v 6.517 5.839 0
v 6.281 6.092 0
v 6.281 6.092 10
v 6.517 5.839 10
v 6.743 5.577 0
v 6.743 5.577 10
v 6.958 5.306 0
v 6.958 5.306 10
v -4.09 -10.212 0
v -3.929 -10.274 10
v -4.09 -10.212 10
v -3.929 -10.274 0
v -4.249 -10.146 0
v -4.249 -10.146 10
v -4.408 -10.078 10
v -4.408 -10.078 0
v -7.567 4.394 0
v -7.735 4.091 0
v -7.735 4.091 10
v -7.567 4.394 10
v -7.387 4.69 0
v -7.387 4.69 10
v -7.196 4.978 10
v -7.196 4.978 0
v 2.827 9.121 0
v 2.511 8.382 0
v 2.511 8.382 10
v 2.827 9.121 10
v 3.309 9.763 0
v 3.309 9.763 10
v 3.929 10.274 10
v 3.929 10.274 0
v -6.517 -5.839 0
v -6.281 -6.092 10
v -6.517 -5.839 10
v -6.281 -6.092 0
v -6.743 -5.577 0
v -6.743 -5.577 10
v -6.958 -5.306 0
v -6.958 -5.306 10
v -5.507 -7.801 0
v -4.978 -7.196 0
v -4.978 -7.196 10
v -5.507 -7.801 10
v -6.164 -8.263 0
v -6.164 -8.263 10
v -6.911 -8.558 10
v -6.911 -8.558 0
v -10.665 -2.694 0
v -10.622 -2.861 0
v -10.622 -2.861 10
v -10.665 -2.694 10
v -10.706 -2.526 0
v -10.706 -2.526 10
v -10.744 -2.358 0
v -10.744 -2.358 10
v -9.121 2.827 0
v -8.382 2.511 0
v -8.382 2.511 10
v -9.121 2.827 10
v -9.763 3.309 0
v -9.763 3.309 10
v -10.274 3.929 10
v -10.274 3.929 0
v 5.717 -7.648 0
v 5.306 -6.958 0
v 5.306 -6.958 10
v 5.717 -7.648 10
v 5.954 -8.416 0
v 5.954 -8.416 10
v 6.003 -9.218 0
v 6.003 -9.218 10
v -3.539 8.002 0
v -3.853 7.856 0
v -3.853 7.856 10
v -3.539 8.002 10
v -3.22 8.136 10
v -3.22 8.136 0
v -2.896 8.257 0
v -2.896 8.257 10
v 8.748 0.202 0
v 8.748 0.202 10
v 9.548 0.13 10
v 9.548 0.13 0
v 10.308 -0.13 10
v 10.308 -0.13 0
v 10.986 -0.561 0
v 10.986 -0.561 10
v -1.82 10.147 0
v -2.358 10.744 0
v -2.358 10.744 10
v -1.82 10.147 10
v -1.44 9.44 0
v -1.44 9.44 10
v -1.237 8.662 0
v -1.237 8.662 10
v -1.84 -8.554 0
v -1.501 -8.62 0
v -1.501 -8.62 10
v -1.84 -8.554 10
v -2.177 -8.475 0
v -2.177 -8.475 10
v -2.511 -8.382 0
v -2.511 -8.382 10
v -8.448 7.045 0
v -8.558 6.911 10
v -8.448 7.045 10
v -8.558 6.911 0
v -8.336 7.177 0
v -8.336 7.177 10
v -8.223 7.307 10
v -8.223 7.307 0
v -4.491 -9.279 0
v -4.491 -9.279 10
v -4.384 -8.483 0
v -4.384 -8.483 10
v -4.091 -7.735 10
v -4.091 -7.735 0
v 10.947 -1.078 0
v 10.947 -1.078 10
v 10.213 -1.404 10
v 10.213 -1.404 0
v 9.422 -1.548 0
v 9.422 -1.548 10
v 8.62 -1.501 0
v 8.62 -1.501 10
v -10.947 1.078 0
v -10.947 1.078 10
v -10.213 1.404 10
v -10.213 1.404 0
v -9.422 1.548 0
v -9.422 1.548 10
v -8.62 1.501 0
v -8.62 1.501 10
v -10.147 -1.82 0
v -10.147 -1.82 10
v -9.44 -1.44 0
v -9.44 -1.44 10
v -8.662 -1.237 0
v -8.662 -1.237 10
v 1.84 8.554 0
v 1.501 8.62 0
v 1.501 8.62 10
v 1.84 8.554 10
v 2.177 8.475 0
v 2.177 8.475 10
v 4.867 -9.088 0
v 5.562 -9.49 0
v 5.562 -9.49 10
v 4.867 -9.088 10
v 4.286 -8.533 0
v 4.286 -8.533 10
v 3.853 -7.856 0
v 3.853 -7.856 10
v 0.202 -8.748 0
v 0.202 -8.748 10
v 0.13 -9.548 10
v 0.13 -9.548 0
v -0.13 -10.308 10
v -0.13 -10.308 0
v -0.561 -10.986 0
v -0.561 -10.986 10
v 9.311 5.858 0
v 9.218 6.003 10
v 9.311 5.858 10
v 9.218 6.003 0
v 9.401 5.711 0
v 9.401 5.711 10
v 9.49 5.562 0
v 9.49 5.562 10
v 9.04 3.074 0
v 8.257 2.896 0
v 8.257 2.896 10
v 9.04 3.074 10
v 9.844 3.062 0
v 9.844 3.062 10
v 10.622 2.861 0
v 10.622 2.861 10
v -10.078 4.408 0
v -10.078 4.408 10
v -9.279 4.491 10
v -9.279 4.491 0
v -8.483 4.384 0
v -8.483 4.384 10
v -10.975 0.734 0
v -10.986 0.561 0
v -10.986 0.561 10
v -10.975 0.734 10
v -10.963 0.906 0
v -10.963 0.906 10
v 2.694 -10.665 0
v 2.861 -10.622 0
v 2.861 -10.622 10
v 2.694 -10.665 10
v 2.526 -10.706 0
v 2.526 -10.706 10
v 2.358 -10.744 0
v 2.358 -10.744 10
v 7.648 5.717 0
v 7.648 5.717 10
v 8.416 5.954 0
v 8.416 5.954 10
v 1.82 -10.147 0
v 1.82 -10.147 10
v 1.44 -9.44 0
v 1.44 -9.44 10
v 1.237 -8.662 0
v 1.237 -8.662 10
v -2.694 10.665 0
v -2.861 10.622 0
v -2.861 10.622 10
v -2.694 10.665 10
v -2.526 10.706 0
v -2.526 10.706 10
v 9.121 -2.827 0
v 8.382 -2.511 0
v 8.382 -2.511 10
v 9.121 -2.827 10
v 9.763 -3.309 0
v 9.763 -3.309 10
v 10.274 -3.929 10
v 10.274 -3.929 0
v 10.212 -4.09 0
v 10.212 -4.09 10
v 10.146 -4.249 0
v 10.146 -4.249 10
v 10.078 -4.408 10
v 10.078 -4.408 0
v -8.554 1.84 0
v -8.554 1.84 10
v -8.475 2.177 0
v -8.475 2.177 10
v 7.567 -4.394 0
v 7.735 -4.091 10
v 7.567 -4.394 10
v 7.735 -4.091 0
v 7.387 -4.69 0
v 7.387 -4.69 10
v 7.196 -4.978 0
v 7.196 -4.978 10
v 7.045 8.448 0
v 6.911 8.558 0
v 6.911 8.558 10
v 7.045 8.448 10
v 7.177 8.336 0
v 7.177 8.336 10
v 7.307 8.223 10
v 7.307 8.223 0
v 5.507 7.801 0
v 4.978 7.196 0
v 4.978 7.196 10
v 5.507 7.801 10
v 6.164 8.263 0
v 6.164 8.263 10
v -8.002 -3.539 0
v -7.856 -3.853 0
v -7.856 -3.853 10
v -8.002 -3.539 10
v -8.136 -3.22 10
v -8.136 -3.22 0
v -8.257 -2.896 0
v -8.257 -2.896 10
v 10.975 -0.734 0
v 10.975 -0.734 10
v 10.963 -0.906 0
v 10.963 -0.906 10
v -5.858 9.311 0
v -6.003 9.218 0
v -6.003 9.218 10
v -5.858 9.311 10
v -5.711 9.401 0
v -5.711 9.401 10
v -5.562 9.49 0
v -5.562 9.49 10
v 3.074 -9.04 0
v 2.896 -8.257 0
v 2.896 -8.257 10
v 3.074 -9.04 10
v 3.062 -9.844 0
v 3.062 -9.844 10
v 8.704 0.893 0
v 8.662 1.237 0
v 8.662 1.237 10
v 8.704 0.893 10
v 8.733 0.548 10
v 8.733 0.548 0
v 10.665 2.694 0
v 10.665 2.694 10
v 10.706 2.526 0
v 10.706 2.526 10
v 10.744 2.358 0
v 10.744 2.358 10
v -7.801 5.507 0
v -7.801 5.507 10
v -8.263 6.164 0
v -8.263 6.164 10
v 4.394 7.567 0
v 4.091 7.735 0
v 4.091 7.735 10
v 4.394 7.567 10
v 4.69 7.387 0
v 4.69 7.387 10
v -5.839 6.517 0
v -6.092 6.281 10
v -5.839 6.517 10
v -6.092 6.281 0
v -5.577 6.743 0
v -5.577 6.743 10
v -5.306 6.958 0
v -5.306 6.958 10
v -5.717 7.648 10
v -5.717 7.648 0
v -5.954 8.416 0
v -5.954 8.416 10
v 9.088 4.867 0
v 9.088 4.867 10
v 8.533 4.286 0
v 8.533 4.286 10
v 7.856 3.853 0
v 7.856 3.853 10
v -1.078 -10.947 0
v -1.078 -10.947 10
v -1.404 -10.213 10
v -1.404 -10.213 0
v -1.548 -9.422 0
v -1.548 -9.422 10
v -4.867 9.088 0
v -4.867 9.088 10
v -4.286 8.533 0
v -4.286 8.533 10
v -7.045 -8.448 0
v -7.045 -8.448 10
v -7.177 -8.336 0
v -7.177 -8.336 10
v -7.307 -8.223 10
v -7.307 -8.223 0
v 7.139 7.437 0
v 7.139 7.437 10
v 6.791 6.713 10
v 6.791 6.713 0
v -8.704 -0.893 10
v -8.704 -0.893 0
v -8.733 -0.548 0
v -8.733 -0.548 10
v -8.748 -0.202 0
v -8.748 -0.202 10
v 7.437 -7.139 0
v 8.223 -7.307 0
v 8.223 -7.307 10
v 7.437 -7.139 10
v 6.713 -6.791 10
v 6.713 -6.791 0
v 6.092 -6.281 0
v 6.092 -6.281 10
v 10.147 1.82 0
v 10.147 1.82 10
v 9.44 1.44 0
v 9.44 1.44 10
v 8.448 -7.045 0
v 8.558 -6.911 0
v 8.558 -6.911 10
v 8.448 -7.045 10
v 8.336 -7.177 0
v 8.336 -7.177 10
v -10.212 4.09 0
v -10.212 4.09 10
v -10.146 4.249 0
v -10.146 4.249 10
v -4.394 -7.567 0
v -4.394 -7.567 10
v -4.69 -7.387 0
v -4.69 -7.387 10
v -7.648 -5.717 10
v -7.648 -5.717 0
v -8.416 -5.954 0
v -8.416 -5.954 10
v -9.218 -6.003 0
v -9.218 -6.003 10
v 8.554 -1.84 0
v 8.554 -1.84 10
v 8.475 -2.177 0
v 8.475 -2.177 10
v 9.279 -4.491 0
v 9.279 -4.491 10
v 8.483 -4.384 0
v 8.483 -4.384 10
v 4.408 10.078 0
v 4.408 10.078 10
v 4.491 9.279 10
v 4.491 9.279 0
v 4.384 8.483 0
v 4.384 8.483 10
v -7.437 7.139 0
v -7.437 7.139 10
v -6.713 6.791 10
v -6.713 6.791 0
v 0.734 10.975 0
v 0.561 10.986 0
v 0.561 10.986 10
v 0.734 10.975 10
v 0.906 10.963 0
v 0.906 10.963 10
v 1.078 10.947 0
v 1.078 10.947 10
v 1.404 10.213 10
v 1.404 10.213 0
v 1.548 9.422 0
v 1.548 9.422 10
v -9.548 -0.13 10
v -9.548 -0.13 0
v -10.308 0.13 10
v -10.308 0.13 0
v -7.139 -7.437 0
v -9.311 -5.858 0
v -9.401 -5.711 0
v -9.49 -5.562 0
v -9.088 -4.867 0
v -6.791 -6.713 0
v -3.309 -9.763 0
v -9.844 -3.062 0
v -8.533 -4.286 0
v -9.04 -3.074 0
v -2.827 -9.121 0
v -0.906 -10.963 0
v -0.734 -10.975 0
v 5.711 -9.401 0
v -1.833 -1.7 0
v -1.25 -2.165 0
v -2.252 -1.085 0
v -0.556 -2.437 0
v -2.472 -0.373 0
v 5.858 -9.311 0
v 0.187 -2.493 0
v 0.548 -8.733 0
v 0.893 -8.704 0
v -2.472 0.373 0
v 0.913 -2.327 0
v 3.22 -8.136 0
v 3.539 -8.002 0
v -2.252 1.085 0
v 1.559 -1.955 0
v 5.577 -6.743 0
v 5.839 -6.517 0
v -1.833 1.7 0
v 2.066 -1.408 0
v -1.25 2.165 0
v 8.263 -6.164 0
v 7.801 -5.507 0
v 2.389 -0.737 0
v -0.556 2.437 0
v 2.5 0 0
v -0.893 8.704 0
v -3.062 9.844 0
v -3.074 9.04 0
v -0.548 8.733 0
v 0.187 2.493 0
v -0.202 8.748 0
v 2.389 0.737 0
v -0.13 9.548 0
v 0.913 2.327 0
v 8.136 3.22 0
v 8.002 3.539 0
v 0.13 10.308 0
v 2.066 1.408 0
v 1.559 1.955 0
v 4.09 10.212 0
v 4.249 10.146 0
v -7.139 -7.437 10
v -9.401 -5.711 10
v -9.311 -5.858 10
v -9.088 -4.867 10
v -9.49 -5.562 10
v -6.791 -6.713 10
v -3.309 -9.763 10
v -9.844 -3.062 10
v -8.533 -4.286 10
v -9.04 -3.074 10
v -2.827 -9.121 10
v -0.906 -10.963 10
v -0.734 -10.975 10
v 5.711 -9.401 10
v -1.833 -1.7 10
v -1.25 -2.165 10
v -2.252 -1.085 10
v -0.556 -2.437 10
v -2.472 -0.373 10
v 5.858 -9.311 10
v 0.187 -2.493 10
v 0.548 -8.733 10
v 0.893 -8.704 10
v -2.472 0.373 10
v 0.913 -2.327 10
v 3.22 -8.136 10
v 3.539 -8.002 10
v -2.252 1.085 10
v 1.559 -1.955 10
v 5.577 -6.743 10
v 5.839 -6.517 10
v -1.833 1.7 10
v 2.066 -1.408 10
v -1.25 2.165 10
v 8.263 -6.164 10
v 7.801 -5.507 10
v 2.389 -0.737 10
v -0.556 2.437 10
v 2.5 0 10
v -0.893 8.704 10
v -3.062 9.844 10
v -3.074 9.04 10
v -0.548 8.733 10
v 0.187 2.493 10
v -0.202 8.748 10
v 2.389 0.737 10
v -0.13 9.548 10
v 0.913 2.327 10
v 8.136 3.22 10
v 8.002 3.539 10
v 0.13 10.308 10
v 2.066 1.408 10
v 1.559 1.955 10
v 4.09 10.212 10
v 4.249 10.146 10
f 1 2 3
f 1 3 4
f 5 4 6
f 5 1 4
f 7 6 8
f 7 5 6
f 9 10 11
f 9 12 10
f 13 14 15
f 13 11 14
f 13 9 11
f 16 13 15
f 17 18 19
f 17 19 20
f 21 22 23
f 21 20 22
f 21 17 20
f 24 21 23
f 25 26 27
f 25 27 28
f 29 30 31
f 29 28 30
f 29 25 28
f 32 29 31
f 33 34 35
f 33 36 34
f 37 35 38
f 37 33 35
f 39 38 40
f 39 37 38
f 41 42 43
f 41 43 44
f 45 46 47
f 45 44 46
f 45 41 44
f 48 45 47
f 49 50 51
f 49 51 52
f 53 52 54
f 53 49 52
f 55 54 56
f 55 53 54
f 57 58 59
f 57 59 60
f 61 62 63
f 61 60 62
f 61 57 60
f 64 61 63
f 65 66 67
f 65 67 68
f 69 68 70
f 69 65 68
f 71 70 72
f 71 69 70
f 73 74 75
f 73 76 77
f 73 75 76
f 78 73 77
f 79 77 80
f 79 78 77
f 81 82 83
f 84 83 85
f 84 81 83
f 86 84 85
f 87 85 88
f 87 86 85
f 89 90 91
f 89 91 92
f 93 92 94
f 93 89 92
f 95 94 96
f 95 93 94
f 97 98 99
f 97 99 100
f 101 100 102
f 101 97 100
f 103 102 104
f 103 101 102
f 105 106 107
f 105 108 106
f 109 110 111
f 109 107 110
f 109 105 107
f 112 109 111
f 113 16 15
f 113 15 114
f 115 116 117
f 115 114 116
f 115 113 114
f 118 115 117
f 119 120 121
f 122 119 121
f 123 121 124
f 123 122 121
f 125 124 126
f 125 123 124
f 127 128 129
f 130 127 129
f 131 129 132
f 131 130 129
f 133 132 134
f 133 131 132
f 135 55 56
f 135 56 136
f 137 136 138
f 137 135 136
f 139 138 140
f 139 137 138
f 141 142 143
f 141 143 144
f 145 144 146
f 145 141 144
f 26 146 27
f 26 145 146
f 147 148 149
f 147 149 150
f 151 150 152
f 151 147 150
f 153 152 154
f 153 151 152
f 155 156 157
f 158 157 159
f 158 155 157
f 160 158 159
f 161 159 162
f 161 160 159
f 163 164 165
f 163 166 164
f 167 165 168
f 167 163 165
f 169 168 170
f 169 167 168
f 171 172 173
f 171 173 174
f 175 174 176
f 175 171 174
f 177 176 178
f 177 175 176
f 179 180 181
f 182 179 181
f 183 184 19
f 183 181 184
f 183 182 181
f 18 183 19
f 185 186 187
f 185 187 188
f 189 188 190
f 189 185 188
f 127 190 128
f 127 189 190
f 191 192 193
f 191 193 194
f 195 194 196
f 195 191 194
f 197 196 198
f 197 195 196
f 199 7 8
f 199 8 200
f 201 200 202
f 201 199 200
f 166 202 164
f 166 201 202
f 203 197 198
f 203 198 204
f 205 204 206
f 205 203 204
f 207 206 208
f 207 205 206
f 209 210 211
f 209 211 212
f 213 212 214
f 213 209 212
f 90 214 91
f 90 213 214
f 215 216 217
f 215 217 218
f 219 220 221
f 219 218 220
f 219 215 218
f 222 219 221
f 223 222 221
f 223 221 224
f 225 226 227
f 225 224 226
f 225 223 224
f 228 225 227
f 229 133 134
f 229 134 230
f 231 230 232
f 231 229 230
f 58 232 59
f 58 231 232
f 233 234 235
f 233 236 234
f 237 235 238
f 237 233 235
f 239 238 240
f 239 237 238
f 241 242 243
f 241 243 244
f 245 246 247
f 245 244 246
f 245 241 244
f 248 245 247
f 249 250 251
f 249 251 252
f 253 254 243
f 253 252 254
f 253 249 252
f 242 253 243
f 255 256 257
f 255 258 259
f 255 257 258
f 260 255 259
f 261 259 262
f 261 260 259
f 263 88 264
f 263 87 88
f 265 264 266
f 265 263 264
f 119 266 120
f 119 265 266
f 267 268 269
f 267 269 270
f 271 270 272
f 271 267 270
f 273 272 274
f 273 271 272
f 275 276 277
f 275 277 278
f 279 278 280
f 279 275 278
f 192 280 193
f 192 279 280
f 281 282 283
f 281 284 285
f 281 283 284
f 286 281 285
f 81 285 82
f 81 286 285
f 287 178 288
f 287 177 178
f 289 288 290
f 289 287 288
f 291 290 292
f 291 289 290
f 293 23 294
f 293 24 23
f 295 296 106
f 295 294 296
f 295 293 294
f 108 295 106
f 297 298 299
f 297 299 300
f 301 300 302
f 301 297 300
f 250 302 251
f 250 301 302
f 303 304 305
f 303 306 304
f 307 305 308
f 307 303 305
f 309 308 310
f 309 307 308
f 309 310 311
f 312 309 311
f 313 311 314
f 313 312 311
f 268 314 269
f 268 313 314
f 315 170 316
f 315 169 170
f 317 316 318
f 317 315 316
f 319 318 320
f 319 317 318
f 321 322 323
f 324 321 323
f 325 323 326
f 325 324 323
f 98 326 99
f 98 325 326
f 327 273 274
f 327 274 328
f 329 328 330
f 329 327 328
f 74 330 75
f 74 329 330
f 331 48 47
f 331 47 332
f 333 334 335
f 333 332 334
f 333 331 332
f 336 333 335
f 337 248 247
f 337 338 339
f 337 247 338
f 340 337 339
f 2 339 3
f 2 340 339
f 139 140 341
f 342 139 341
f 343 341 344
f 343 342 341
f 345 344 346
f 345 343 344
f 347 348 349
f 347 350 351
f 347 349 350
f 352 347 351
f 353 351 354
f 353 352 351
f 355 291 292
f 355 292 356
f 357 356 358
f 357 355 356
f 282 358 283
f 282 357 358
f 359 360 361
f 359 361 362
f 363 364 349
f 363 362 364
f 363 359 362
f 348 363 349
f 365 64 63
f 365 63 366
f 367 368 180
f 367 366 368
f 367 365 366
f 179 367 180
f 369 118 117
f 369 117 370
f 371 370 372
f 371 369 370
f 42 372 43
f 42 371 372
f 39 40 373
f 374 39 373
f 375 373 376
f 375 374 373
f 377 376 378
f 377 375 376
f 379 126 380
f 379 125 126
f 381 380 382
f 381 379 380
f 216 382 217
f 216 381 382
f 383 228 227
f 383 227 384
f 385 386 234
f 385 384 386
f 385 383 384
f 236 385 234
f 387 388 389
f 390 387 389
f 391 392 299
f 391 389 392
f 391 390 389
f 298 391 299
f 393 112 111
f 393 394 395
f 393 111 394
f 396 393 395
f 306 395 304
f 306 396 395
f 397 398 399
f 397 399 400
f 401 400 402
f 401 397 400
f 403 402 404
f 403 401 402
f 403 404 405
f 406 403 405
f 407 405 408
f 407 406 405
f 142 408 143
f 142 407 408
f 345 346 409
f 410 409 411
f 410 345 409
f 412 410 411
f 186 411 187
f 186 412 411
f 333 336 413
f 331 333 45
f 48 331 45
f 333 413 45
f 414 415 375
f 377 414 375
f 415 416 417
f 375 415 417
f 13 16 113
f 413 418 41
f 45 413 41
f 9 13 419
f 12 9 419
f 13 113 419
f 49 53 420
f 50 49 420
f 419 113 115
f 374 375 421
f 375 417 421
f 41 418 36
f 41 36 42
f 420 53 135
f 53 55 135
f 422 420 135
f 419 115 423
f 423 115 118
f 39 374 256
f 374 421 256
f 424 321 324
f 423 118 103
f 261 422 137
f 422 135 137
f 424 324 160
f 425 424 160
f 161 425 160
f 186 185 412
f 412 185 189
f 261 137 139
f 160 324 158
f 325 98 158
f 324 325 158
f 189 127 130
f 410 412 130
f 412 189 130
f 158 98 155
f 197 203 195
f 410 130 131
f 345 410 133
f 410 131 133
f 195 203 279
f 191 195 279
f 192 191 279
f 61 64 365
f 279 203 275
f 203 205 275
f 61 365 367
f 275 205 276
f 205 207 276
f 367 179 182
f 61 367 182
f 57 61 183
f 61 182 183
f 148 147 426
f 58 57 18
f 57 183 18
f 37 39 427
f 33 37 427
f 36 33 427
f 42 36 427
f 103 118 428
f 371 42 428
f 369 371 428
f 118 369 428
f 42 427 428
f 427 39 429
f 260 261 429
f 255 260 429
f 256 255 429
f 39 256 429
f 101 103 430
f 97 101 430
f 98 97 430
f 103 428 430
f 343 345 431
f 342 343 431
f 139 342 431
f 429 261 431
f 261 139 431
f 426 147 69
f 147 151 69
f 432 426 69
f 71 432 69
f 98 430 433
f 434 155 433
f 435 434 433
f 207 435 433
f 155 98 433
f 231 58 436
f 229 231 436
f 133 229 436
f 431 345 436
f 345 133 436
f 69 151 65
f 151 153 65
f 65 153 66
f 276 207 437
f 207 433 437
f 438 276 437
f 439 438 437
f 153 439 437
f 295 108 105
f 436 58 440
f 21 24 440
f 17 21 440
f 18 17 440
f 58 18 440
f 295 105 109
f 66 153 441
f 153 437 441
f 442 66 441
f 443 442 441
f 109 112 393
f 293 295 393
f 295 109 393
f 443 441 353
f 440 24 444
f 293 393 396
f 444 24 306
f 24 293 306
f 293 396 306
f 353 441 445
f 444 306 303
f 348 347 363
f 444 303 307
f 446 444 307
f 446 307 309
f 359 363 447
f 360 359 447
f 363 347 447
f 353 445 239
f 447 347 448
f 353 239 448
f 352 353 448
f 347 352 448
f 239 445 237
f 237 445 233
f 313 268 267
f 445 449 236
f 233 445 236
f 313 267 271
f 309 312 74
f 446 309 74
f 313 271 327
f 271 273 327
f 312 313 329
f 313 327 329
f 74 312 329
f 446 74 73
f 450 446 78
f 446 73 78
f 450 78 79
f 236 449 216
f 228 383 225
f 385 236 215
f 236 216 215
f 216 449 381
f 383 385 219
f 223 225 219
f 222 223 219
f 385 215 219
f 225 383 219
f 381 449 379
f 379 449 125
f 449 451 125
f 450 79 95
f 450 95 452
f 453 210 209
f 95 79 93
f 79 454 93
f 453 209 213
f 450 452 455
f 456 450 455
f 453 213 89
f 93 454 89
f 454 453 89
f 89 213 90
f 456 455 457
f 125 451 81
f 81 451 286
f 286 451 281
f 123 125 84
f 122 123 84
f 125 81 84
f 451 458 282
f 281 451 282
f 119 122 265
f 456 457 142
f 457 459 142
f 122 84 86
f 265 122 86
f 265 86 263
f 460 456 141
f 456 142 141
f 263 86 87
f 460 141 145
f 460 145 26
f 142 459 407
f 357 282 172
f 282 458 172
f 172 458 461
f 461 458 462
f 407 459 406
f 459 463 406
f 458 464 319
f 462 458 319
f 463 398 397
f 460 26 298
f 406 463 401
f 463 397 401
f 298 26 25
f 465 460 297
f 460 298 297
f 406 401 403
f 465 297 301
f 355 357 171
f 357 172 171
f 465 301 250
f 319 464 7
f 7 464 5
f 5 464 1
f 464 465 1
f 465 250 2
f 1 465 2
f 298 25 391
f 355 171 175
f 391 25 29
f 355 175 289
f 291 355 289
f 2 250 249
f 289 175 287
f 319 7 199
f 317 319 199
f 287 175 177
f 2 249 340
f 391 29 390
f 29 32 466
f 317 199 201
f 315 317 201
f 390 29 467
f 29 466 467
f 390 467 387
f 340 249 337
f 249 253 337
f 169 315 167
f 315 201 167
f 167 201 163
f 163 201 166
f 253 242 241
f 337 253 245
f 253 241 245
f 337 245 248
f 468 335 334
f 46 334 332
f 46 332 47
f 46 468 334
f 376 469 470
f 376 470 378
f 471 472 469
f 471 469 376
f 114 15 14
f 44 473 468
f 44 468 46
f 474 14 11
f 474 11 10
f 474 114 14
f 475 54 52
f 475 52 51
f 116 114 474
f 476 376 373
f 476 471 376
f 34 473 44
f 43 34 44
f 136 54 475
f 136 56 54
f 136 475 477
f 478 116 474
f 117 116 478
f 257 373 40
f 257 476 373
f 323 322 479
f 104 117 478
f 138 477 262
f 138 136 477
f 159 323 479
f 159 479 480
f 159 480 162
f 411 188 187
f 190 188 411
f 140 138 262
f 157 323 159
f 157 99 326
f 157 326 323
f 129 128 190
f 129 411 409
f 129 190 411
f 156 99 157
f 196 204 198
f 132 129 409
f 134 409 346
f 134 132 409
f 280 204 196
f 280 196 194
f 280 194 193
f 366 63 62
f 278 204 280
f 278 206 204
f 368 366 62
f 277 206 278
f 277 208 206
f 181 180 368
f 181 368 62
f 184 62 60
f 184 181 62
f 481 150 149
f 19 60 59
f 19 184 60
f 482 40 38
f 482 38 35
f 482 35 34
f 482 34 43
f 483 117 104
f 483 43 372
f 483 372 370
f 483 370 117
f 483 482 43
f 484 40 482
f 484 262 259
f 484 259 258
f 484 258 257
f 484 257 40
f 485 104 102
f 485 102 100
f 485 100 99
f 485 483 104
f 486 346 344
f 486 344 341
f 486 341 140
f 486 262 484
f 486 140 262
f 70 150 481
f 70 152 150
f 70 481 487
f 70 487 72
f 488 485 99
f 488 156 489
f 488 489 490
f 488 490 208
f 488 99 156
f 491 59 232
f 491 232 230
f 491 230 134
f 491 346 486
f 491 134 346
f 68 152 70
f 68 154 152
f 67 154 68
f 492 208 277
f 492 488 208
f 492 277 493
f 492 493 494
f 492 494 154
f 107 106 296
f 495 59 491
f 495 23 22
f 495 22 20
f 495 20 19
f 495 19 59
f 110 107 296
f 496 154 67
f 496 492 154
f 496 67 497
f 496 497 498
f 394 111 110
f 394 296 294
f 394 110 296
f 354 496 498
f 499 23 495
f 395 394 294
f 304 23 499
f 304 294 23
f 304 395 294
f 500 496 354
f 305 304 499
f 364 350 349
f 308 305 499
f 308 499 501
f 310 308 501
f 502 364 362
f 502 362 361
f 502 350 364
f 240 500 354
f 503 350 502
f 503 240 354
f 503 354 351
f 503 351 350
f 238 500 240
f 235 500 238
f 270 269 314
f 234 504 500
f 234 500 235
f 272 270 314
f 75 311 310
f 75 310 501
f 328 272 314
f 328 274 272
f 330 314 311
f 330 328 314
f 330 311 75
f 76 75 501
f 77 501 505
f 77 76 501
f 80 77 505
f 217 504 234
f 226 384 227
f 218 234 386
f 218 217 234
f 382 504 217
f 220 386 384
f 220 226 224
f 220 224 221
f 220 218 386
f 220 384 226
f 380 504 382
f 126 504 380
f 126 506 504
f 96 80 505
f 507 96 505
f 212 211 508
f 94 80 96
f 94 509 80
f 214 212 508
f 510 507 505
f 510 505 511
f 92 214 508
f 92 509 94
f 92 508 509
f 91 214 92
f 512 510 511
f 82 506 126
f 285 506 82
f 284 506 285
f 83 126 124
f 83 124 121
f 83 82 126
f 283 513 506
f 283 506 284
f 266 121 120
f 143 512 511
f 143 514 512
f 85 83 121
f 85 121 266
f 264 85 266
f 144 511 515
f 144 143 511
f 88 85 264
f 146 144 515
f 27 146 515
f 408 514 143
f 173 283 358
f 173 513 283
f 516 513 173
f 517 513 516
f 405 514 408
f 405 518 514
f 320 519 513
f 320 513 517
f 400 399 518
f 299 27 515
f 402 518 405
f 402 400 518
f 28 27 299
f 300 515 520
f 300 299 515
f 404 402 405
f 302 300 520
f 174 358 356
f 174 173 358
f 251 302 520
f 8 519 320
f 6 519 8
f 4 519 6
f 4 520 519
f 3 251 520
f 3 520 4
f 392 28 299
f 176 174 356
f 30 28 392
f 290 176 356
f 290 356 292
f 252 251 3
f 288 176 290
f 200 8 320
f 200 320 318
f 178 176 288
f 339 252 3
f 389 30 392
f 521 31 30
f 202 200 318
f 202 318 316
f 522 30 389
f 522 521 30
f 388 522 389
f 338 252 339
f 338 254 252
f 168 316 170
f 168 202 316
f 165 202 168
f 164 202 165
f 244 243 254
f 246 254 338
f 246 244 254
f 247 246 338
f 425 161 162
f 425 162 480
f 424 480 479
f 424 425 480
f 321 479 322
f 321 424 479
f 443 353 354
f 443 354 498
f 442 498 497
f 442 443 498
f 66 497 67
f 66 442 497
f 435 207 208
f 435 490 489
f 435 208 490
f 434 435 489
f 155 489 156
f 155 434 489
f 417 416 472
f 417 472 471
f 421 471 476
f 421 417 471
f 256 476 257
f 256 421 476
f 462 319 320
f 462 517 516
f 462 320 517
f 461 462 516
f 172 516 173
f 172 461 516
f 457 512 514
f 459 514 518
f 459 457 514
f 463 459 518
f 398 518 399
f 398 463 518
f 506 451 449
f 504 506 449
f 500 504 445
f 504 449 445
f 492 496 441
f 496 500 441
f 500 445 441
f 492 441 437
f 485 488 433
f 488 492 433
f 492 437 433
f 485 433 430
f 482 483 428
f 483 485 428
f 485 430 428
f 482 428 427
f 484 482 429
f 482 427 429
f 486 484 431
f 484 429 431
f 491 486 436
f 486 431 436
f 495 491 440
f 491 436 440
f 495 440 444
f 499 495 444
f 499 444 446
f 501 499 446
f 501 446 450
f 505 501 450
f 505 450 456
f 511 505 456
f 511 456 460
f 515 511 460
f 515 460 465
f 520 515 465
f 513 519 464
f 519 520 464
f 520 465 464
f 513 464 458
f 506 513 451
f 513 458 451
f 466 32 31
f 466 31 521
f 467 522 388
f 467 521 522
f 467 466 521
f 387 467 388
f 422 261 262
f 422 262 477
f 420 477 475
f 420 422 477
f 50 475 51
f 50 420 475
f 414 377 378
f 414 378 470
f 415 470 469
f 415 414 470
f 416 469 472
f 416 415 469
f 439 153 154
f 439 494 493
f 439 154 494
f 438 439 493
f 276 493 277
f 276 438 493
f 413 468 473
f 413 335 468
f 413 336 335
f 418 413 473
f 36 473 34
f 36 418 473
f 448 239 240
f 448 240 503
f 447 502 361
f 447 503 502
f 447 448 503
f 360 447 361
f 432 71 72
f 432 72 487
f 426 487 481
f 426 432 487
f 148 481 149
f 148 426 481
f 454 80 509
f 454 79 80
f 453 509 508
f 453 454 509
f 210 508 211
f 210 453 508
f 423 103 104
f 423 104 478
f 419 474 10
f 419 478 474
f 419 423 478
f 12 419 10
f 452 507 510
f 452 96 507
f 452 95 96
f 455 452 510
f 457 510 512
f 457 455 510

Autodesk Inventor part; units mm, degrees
ref_plane "YZ Plane" through (0, 0, 0) normal (1, 0, 0) x (0, 1, 0)
ref_plane "XZ Plane" through (0, 0, 0) normal (0, 1, 0) x (-1, 0, 0)
ref_plane "XY Plane" through (0, 0, 0) normal (0, 0, 1) x (1, 0, 0)
sketch "Sketch1" plane through (0, 0, 0) normal (0, 0, 1) x (1, 0, 0)
  arc A0 (10.947, -1.0781) -> (10.9857, -0.5614) centre (0, 0) ccw
  circle A1 centre (0, 0) radius 8.75
  line L0 (0, 0) -> (18.5832, 0) construction
  arc A2 (10.9857, -0.5614) -> (8.7477, 0.2024) centre (8.8444, -3.175) ccw
  line L1 (0, 0) -> (16.1968, 0) construction
  line L2 (0, 0) -> (16.1894, 0) construction
  arc A3 (8.6204, -1.5007) -> (10.947, -1.0781) centre (9.2181, 1.8248) ccw
  arc A4 (10.7444, 2.3575) -> (10.6215, 2.8609) centre (0, 0) ccw
  arc A5 (10.6215, 2.8609) -> (8.257, 2.8956) centre (9.3926, -0.2865) ccw
  arc A6 (8.6622, 1.2366) -> (10.7444, 2.3575) centre (8.2031, 4.584) ccw
  arc A7 (9.49, 5.5623) -> (9.2176, 6.003) centre (0, 0) ccw
  arc A8 (9.2176, 6.003) -> (6.958, 5.3055) centre (9.0215, 2.63) ccw
  arc A9 (7.8561, 3.8529) -> (9.49, 5.5623) centre (6.385, 6.8946) ccw
  arc A10 (7.3067, 8.2226) -> (6.9114, 8.5576) centre (0, 0) ccw
  arc A11 (6.9114, 8.5576) -> (4.978, 7.196) centre (7.7672, 5.289) ccw
  arc A12 (6.281, 6.0919) -> (7.3067, 8.2226) centre (3.942, 8.5302) ccw
  arc A13 (4.4082, 10.0781) -> (3.9287, 10.2745) centre (0, 0) ccw
  arc A14 (3.9287, 10.2745) -> (2.5107, 8.3821) centre (5.7527, 7.4304) ccw
  arc A15 (4.0911, 7.7347) -> (4.4082, 10.0781) centre (1.1131, 9.3309) ccw
  arc A16 (1.0781, 10.947) -> (0.5614, 10.9857) centre (0, 0) ccw
  arc A17 (0.5614, 10.9857) -> (-0.2024, 8.7477) centre (3.175, 8.8444) ccw
  arc A18 (1.5007, 8.6204) -> (1.0781, 10.947) centre (-1.8248, 9.2181) ccw
  arc A19 (-2.3575, 10.7444) -> (-2.8609, 10.6215) centre (0, 0) ccw
  arc A20 (-2.8609, 10.6215) -> (-2.8956, 8.257) centre (0.2865, 9.3926) ccw
  arc A21 (-1.2366, 8.6622) -> (-2.3575, 10.7444) centre (-4.584, 8.2031) ccw
  arc A22 (-5.5623, 9.49) -> (-6.003, 9.2176) centre (0, 0) ccw
  arc A23 (-6.003, 9.2176) -> (-5.3055, 6.958) centre (-2.63, 9.0215) ccw
  arc A24 (-3.8529, 7.8561) -> (-5.5623, 9.49) centre (-6.8946, 6.385) ccw
  arc A25 (-8.2226, 7.3067) -> (-8.5576, 6.9114) centre (0, 0) ccw
  arc A26 (-8.5576, 6.9114) -> (-7.196, 4.978) centre (-5.289, 7.7672) ccw
  arc A27 (-6.0919, 6.281) -> (-8.2226, 7.3067) centre (-8.5302, 3.942) ccw
  arc A28 (-10.0781, 4.4082) -> (-10.2745, 3.9287) centre (0, 0) ccw
  arc A29 (-10.2745, 3.9287) -> (-8.3821, 2.5107) centre (-7.4304, 5.7527) ccw
  arc A30 (-7.7347, 4.0911) -> (-10.0781, 4.4082) centre (-9.3309, 1.1131) ccw
  arc A31 (-10.947, 1.0781) -> (-10.9857, 0.5614) centre (0, 0) ccw
  arc A32 (-10.9857, 0.5614) -> (-8.7477, -0.2024) centre (-8.8444, 3.175) ccw
  arc A33 (-8.6204, 1.5007) -> (-10.947, 1.0781) centre (-9.2181, -1.8248) ccw
  arc A34 (-10.7444, -2.3575) -> (-10.6215, -2.8609) centre (0, 0) ccw
  arc A35 (-10.6215, -2.8609) -> (-8.257, -2.8956) centre (-9.3926, 0.2865) ccw
  arc A36 (-8.6622, -1.2366) -> (-10.7444, -2.3575) centre (-8.2031, -4.584) ccw
  arc A37 (-9.49, -5.5623) -> (-9.2176, -6.003) centre (0, 0) ccw
  arc A38 (-9.2176, -6.003) -> (-6.958, -5.3055) centre (-9.0215, -2.63) ccw
  arc A39 (-7.8561, -3.8529) -> (-9.49, -5.5623) centre (-6.385, -6.8946) ccw
  arc A40 (-7.3067, -8.2226) -> (-6.9114, -8.5576) centre (0, 0) ccw
  arc A41 (-6.9114, -8.5576) -> (-4.978, -7.196) centre (-7.7672, -5.289) ccw
  arc A42 (-6.281, -6.0919) -> (-7.3067, -8.2226) centre (-3.942, -8.5302) ccw
  arc A43 (-4.4082, -10.0781) -> (-3.9287, -10.2745) centre (0, 0) ccw
  arc A44 (-3.9287, -10.2745) -> (-2.5107, -8.3821) centre (-5.7527, -7.4304) ccw
  arc A45 (-4.0911, -7.7347) -> (-4.4082, -10.0781) centre (-1.1131, -9.3309) ccw
  arc A46 (-1.0781, -10.947) -> (-0.5614, -10.9857) centre (0, 0) ccw
  arc A47 (-0.5614, -10.9857) -> (0.2024, -8.7477) centre (-3.175, -8.8444) ccw
  arc A48 (-1.5007, -8.6204) -> (-1.0781, -10.947) centre (1.8248, -9.2181) ccw
  arc A49 (2.3575, -10.7444) -> (2.8609, -10.6215) centre (0, 0) ccw
  arc A50 (2.8609, -10.6215) -> (2.8956, -8.257) centre (-0.2865, -9.3926) ccw
  arc A51 (1.2366, -8.6622) -> (2.3575, -10.7444) centre (4.584, -8.2031) ccw
  arc A52 (5.5623, -9.49) -> (6.003, -9.2176) centre (0, 0) ccw
  arc A53 (6.003, -9.2176) -> (5.3055, -6.958) centre (2.63, -9.0215) ccw
  arc A54 (3.8529, -7.8561) -> (5.5623, -9.49) centre (6.8946, -6.385) ccw
  arc A55 (8.2226, -7.3067) -> (8.5576, -6.9114) centre (0, 0) ccw
  arc A56 (8.5576, -6.9114) -> (7.196, -4.978) centre (5.289, -7.7672) ccw
  arc A57 (6.0919, -6.281) -> (8.2226, -7.3067) centre (8.5302, -3.942) ccw
  arc A58 (10.0781, -4.4082) -> (10.2745, -3.9287) centre (0, 0) ccw
  arc A59 (10.2745, -3.9287) -> (8.3821, -2.5107) centre (7.4304, -5.7527) ccw
  arc A60 (7.7347, -4.0911) -> (10.0781, -4.4082) centre (9.3309, -1.1131) ccw
  circle A61 centre (0, 0) radius 2.5
  point P0 (-0.2024, 8.7477)
  point P1 (-1.2366, 8.6622)
  point P2 (-2.8956, 8.257)
  point P3 (-3.8529, 7.8561)
  point P4 (-5.3055, 6.958)
  point P5 (-8.7477, -0.2024)
  point P6 (-8.257, -2.8956)
  point P7 (-7.8561, -3.8529)
  point P8 (-6.958, -5.3055)
  point P9 (-4.0911, -7.7347)
  point P10 (-2.5107, -8.3821)
  point P11 (0.2024, -8.7477)
  point P12 (1.2366, -8.6622)
  point P13 (2.8956, -8.257)
  point P14 (3.8529, -7.8561)
  point P15 (7.196, -4.978)
  point P16 (7.7347, -4.0911)
  point P17 (8.3821, -2.5107)
  point P18 (8.6622, 1.2366)
  point P19 (8.257, 2.8956)
  point P20 (7.8561, 3.8529)
  point P21 (6.958, 5.3055)
  point P22 (4.978, 7.196)
  point P23 (4.0911, 7.7347)
  point P24 (2.5107, 8.3821)
  dimension "d2" = 17.5
  dimension "d1" = 22
  dimension "d8" = 360
  dimension "d10" = 5
extrude "Extrusion1" add sketch "Sketch1" along normal blind 10
properties part number "PLANETARIO SOL"
